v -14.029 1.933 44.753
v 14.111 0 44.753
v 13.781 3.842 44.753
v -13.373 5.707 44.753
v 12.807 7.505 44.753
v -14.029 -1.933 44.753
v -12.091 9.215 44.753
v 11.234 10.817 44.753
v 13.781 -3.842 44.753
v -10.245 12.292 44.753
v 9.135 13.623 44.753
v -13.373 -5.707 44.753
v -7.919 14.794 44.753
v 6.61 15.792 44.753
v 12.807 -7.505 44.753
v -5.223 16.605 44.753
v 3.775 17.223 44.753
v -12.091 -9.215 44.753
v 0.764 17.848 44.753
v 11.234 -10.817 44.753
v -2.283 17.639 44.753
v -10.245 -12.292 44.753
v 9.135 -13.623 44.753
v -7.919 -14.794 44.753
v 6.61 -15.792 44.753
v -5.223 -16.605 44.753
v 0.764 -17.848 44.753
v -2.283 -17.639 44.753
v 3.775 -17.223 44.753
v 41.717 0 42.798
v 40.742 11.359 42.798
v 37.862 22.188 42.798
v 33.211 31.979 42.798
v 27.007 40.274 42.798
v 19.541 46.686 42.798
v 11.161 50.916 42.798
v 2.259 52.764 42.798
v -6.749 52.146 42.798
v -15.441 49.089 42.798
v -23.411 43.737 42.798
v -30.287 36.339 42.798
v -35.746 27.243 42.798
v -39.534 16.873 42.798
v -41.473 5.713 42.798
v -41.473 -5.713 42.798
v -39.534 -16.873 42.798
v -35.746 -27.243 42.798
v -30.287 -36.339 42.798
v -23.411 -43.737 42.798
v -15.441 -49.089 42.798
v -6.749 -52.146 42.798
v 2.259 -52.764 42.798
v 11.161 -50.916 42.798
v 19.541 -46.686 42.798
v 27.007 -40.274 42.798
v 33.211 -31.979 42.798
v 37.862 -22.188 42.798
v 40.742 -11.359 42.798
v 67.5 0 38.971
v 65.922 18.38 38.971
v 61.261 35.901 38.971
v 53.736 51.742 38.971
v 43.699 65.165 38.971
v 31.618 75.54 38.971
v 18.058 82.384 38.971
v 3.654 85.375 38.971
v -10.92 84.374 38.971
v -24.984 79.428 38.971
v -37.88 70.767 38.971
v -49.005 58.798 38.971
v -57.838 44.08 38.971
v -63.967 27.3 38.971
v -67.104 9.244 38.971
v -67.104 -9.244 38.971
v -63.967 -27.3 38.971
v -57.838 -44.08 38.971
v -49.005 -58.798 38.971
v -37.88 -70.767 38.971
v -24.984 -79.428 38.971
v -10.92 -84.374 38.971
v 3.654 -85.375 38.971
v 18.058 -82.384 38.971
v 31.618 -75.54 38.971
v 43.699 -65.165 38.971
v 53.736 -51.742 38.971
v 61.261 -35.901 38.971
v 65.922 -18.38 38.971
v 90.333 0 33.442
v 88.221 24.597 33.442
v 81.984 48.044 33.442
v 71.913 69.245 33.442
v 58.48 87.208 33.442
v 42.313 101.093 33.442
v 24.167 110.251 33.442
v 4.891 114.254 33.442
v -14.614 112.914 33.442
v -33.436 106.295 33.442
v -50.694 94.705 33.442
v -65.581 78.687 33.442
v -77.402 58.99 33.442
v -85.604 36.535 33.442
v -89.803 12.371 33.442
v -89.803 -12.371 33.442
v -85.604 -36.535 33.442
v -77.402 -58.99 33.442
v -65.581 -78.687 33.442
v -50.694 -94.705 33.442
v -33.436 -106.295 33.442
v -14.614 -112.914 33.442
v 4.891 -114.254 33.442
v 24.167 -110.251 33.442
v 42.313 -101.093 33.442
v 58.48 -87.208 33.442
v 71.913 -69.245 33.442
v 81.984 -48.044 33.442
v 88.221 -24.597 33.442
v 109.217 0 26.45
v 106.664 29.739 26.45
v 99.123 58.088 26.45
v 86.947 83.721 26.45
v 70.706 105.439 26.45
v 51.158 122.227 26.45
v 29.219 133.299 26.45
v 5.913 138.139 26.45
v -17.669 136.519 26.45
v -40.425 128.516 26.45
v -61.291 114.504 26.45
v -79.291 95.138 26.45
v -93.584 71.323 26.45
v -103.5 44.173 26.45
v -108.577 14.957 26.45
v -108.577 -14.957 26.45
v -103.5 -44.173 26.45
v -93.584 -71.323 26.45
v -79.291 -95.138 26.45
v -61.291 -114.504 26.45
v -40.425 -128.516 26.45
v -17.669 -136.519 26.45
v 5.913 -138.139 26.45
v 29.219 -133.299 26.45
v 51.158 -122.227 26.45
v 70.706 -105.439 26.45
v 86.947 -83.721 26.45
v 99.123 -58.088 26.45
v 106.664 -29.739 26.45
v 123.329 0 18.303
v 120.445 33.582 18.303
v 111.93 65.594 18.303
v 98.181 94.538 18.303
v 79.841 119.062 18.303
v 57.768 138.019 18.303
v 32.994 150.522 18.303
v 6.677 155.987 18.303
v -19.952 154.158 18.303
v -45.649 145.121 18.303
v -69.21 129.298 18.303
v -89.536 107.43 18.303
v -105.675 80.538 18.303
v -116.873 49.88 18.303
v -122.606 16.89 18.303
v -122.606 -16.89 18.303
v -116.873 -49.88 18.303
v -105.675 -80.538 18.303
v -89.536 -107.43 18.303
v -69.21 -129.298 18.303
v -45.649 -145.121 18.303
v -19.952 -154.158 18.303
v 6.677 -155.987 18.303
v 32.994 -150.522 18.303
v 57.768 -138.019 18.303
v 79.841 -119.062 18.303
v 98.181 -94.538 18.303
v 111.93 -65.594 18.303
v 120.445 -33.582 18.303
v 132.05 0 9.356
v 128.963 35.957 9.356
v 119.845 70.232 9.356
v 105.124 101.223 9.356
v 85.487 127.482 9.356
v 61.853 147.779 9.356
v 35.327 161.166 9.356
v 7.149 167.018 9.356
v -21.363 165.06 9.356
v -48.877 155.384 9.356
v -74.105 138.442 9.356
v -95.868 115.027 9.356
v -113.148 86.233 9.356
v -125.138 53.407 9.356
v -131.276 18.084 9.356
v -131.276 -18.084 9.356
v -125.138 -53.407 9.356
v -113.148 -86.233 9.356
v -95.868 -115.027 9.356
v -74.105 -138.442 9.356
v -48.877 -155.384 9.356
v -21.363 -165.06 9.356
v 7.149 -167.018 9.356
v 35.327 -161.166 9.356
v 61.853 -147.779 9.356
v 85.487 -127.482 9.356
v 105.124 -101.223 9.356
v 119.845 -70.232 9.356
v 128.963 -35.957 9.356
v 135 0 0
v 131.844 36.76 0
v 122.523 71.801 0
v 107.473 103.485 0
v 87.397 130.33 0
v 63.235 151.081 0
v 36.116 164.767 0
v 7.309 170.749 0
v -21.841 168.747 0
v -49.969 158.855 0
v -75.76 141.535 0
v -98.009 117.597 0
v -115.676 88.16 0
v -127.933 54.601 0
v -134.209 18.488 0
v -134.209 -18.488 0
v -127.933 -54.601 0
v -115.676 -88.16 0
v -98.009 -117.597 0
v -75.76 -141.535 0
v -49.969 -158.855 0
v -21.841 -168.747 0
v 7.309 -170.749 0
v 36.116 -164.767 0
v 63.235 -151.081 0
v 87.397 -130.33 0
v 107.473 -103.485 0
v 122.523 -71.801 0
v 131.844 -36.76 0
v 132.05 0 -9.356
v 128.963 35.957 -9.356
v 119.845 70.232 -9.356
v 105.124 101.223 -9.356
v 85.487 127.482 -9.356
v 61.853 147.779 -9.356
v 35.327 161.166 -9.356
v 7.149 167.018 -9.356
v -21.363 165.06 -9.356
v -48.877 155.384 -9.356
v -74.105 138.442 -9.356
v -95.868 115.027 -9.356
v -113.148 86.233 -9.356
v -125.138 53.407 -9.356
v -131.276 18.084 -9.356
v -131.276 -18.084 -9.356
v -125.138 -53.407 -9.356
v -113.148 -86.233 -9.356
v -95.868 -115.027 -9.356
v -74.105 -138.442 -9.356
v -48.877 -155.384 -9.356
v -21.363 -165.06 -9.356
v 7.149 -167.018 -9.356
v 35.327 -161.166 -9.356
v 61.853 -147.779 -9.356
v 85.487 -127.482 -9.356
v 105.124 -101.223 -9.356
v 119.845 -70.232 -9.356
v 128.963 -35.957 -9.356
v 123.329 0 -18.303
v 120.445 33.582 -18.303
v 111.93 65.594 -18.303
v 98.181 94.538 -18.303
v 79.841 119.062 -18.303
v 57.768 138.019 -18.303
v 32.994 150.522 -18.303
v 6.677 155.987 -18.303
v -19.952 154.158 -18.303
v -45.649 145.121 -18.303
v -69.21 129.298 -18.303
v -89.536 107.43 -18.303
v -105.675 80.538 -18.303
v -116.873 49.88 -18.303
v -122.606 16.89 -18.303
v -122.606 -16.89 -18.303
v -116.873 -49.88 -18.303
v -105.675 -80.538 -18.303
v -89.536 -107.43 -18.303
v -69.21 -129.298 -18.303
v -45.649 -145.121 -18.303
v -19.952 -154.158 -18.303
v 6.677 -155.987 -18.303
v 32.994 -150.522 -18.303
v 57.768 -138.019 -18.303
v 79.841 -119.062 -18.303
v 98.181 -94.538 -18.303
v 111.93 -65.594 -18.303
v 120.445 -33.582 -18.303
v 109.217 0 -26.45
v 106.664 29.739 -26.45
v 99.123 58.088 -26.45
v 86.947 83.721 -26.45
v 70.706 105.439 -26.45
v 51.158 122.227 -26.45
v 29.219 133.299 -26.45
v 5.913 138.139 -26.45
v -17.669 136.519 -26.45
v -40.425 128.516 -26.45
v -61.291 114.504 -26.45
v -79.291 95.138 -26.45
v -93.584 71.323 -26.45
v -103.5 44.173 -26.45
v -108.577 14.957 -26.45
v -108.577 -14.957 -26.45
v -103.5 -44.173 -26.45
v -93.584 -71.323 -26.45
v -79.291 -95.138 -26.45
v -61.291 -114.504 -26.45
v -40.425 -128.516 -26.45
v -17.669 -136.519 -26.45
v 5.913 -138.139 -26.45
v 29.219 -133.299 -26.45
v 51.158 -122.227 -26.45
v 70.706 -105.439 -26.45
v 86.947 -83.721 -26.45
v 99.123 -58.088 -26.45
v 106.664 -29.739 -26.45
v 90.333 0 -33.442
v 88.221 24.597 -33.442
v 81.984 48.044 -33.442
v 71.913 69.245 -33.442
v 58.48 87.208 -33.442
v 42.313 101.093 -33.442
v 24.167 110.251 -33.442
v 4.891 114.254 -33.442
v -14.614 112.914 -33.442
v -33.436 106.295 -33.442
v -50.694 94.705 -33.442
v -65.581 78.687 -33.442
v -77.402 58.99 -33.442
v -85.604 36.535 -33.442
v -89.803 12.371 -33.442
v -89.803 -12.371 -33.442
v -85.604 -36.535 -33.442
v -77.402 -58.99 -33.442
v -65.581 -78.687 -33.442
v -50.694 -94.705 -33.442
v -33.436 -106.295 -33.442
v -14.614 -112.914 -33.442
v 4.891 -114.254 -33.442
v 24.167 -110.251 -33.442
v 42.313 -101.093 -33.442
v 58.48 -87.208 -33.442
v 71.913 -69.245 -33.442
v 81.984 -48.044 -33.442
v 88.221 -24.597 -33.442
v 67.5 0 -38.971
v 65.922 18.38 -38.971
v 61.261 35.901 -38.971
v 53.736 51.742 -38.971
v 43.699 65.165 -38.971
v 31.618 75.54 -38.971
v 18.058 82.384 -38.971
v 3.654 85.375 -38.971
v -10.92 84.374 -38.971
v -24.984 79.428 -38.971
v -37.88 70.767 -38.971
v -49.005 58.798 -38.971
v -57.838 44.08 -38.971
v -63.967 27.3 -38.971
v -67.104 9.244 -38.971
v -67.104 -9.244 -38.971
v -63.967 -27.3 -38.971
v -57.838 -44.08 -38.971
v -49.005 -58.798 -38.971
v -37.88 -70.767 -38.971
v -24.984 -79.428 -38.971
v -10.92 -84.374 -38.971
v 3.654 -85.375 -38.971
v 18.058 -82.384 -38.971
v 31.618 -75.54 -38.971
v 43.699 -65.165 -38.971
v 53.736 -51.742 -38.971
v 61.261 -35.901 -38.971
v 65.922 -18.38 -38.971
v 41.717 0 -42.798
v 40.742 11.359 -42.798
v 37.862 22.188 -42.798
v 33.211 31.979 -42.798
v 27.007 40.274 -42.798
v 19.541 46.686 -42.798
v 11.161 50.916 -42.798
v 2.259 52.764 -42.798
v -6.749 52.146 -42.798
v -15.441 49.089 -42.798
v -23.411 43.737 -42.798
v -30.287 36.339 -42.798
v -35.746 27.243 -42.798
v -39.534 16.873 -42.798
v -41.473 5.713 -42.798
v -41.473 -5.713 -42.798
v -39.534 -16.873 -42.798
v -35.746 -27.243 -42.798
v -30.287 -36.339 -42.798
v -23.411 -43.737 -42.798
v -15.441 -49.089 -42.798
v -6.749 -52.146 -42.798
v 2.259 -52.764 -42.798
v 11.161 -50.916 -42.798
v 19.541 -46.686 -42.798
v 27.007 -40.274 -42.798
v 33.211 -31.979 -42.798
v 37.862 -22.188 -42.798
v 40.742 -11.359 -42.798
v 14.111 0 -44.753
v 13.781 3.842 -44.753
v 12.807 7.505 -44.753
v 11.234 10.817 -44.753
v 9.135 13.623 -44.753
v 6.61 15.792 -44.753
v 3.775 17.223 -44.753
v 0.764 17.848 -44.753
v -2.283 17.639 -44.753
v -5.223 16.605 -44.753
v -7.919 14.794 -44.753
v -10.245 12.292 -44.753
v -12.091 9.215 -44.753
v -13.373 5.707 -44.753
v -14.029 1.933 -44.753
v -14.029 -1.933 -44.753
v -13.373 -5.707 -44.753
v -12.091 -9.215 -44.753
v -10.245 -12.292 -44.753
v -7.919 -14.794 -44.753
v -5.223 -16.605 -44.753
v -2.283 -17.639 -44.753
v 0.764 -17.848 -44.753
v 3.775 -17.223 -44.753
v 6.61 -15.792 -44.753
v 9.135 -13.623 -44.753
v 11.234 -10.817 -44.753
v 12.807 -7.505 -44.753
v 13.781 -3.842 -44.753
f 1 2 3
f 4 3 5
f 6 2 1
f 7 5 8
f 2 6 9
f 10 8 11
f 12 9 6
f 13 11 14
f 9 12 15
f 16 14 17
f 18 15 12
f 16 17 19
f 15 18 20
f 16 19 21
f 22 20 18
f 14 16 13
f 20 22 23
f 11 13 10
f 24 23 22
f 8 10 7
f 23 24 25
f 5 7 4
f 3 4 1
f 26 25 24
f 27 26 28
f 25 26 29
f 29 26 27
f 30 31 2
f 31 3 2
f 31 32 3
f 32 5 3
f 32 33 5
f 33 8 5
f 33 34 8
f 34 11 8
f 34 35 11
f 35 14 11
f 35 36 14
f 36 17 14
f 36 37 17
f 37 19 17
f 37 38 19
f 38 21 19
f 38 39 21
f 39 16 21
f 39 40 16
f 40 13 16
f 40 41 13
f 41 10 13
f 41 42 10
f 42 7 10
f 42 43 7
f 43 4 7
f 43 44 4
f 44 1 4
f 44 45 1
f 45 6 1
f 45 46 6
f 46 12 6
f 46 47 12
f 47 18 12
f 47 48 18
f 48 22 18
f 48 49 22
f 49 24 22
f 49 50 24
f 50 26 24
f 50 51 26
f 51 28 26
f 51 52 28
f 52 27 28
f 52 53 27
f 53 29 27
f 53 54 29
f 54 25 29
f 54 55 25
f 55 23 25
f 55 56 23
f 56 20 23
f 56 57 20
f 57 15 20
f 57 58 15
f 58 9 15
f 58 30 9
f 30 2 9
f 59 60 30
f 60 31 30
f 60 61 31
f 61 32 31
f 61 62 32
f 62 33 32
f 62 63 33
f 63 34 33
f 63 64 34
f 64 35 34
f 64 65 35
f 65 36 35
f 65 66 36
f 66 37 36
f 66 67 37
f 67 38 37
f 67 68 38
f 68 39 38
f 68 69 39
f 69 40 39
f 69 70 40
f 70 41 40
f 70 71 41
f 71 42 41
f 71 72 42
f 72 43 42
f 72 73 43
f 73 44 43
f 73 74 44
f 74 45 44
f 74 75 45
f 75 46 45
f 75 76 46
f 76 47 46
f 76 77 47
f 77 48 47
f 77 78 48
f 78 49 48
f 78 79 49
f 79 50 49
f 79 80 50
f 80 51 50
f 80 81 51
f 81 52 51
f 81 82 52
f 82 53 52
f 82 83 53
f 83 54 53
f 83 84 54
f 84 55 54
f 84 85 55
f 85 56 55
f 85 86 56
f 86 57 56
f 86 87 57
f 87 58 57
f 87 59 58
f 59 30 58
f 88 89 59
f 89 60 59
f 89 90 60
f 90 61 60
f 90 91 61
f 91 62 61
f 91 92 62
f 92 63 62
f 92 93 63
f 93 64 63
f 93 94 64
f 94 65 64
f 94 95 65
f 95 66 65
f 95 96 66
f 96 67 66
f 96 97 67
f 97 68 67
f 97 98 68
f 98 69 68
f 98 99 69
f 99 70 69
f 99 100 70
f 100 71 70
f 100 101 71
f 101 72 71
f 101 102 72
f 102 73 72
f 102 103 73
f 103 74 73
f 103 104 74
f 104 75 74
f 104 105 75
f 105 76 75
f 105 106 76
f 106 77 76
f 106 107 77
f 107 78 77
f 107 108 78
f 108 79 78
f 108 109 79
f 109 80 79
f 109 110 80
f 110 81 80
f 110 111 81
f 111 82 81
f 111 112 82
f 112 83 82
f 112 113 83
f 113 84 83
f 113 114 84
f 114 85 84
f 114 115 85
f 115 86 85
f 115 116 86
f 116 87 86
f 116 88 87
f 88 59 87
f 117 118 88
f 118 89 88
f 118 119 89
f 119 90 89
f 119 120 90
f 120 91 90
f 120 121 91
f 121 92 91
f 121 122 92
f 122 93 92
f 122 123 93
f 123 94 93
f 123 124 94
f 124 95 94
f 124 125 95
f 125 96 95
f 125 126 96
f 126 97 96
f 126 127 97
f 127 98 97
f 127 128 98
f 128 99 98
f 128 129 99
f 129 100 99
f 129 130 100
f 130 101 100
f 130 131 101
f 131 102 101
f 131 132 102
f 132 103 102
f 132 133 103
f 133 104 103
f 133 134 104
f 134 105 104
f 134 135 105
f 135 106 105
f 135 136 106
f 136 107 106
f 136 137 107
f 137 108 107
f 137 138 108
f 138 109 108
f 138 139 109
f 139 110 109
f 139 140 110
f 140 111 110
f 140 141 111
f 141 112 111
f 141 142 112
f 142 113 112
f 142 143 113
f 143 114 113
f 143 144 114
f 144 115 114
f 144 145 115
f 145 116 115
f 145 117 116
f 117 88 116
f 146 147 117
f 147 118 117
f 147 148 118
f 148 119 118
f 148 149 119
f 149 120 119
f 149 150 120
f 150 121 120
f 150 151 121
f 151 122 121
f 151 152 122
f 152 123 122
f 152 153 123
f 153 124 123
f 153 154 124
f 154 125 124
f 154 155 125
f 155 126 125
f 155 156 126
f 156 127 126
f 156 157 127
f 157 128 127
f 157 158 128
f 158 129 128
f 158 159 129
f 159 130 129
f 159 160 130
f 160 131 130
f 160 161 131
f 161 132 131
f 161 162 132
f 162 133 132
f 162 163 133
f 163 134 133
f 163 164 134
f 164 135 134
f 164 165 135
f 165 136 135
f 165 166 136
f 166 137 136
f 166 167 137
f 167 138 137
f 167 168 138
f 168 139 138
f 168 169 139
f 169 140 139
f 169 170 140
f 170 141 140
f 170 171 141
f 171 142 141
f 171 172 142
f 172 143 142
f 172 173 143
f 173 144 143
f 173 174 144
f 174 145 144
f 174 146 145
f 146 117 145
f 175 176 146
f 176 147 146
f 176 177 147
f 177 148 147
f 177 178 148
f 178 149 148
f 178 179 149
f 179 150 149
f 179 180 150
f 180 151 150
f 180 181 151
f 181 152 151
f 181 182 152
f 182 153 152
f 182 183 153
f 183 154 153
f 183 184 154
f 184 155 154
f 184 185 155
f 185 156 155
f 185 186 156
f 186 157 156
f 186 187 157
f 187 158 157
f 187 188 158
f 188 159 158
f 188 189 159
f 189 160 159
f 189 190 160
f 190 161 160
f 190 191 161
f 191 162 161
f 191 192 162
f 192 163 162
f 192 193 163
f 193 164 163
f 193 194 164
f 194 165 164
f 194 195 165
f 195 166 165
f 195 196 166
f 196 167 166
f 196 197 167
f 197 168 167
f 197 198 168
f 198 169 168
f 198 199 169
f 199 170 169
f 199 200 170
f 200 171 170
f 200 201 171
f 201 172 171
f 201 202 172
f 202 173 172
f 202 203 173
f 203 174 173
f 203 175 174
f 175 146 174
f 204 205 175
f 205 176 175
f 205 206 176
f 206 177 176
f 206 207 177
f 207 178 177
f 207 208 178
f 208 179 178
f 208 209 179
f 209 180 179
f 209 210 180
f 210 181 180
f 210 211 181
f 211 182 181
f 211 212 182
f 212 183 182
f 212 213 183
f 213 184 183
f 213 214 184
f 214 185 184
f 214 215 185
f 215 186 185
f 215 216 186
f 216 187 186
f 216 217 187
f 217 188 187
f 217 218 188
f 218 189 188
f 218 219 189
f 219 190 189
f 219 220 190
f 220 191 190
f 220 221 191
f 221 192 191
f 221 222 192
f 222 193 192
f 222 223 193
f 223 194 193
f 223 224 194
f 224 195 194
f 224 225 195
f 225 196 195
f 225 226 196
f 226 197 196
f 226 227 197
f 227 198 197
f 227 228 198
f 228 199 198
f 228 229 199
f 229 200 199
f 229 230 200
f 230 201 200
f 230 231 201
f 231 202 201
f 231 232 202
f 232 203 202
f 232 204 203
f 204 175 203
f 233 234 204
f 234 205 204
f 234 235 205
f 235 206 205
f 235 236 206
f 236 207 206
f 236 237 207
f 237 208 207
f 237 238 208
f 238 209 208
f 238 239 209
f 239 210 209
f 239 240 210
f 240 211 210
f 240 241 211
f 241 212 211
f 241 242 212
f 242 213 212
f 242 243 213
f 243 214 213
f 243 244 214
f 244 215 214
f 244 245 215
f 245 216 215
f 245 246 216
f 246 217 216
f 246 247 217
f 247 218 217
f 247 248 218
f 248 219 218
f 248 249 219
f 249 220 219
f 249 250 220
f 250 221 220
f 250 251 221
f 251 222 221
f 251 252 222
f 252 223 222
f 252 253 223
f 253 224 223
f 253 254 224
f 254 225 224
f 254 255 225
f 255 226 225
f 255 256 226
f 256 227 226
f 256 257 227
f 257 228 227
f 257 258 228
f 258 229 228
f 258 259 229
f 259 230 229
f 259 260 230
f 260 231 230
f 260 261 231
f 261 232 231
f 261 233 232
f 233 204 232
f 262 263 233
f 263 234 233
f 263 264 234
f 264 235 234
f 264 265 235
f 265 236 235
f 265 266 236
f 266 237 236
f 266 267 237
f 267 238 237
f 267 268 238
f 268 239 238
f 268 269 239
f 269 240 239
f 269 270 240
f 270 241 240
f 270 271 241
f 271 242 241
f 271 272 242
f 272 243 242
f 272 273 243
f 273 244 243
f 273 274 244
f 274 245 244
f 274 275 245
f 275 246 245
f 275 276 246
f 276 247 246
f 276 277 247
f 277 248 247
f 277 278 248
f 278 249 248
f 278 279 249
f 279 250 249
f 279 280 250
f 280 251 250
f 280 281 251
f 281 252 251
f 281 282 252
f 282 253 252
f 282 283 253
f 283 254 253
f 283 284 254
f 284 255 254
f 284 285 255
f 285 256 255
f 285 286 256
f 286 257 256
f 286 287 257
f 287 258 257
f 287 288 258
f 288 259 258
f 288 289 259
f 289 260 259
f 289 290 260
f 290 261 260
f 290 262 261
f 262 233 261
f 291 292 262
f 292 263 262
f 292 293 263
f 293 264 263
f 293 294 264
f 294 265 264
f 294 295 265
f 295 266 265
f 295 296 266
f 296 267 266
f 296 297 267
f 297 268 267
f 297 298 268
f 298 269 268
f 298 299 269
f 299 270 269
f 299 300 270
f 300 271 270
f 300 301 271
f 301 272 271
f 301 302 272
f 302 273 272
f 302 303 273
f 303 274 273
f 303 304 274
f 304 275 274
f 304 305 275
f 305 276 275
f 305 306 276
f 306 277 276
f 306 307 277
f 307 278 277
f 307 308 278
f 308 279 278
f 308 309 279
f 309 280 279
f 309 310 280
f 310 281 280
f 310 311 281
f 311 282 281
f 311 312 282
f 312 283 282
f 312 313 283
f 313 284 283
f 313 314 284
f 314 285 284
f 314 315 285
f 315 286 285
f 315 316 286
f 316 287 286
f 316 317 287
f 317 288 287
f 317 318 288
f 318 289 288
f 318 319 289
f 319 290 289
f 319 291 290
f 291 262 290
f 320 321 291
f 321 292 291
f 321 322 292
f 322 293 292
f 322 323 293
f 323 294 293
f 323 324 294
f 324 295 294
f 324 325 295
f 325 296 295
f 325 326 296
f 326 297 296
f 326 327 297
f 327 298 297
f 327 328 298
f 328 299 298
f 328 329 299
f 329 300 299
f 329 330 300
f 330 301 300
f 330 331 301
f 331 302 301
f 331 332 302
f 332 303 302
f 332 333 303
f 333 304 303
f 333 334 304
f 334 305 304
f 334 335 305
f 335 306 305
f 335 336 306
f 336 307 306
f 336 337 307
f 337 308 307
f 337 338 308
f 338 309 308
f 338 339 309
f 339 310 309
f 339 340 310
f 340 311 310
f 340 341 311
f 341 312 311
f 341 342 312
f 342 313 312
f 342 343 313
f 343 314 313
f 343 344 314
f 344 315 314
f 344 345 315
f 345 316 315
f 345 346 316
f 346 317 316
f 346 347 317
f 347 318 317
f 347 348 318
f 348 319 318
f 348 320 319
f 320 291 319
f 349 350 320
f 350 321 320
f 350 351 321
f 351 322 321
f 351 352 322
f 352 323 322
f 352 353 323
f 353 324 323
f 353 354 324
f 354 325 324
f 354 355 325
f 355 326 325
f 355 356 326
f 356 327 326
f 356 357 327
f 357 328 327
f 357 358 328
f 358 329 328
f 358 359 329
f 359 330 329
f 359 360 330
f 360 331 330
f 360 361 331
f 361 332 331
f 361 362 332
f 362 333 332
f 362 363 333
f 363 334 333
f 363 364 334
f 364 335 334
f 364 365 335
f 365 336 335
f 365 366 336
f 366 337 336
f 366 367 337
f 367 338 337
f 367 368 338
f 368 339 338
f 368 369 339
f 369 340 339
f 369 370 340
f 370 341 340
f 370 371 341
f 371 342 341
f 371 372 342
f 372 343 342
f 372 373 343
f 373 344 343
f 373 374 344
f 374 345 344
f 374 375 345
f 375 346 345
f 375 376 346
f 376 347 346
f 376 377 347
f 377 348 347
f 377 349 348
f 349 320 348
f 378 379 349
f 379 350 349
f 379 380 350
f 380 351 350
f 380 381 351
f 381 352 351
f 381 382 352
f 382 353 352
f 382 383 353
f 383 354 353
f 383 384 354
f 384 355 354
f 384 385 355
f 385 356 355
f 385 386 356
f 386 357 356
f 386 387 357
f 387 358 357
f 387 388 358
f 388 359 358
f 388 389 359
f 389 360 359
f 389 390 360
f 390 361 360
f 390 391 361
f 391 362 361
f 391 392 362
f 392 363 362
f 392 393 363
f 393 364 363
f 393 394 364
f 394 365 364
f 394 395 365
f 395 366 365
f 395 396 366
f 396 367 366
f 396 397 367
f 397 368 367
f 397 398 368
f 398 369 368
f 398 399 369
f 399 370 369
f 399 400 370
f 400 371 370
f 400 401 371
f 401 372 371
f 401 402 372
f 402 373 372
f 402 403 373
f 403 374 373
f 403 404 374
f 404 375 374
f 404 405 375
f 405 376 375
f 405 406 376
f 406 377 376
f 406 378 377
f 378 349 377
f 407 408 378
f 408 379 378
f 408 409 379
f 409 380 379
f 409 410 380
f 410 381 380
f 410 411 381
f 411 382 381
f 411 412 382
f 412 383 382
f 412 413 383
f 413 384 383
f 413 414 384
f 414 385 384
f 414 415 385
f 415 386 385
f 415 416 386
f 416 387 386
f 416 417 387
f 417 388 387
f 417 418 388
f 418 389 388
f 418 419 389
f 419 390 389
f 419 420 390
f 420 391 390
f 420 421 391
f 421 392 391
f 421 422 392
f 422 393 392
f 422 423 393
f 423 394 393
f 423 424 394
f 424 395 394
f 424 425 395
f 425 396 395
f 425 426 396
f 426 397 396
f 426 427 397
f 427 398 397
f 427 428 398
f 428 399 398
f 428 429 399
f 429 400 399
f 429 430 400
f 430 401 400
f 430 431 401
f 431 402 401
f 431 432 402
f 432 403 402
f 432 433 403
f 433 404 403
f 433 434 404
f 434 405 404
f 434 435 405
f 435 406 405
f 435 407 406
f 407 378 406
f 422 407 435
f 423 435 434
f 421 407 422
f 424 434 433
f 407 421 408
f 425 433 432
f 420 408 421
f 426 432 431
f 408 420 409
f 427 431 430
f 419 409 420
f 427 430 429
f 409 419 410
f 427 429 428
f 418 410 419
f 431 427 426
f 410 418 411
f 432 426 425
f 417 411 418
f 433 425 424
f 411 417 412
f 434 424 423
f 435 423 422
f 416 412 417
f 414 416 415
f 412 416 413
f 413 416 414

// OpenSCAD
// Generated by SolidPython 1.0.1 on 2020-07-29 00:46:52


scale(v = [15, 19, 5]) {
	sphere(r = 9);
}
/***********************************************
*********      SolidPython code:      **********
************************************************
 
# import packages: SolidPython
from solid import *
from solid.utils import *
from itertools import chain, combinations, permutations


class Resize:

    def __init__(self, scad_file):
        self.scad_file = scad_file
        #self.scad_file = import_scad(scad_file)
        # cone/cylinder param:
        self.r1 = 0
        self.r2 = 0
        self.h = 0
        # rectangular prism param:
        self.w = 0
        self.l = 0
        # ellipse param:
        self.r = 0

    # import OpenScad code (file name corresponds to shape)


    # classify shape + parameters
    def assign(self, param1, param2, param3):
        if self.scad_file == 'cone.scad':
            self.r1 = param1
            self.r2 = param2
            self.h = param3
        elif self.scad_file == 'cylinder.scad':
            self.r1 = param1
            self.r2 = param2
            self.h = param3
        elif self.scad_file == 'rectangularPrism.scad':
            self.h = param1
            self.l = param2
            self.w = param3
        else:
            self.r = param1
            self.h = param2

    # resize parameters
    def iterate(self):
        x = range(3, 20, 2)
        i = 1
        if self.scad_file == 'cone.scad':
            tempList = list(permutations(x, 2))
            for temp in tempList:
                param1 = temp[0]
                param2 = temp[1]
                filepath = 'produced_scad_files/' + 'cone' + str(param1) + '_' + str(param2) + '_' + '.scad'
                scad_render_to_file(cylinder(h=param1, r1=param2, r2=0), filepath)

        elif self.scad_file == 'cylinder.scad':
            tempList = list(permutations(x, 3))
            for temp in tempList:
                param1 = temp[0]
                param2 = temp[1]
                filepath = 'produced_scad_files/' + 'cylinder' + str(param1) + '_' + str(param2) + '_' + '.scad'
                scad_render_to_file(cylinder(h=param1, r1=param2, r2=param2), filepath)

        elif self.scad_file == 'rectangularPrism.scad':
            tempList = list(permutations(x, 3))
            for temp in tempList:
                param1 = temp[0]
                param2 = temp[1]
                param3 = temp[2]
                filepath = 'produced_scad_files/' + 'rectangularPrism' + str(param1) + '_' + str(param2) + '_' + str(
                    param3) + '.scad'
                scad_render_to_file(cube(size=(param1, param2, param3)), filepath)

        elif self.scad_file == 'ellipse.scad':
            tempList = list(permutations(x, 4))
            for temp in tempList:
                param1 = temp[0]
                param2 = temp[1]
                param3 = temp[2]
                param4 = temp[3]
                filepath = 'produced_scad_files/' + 'ellipse' + str(param1) + '_' + str(param2) + '_' + str(param3) + '_' + str(param4) + '.scad'
                scad_render_to_file(scale([param1, param2, param3])(sphere(r=param4)), filepath)

    def render_to_scadfile(self):
        scad_render_to_file(scad, 'example.scad') 
 
************************************************/
